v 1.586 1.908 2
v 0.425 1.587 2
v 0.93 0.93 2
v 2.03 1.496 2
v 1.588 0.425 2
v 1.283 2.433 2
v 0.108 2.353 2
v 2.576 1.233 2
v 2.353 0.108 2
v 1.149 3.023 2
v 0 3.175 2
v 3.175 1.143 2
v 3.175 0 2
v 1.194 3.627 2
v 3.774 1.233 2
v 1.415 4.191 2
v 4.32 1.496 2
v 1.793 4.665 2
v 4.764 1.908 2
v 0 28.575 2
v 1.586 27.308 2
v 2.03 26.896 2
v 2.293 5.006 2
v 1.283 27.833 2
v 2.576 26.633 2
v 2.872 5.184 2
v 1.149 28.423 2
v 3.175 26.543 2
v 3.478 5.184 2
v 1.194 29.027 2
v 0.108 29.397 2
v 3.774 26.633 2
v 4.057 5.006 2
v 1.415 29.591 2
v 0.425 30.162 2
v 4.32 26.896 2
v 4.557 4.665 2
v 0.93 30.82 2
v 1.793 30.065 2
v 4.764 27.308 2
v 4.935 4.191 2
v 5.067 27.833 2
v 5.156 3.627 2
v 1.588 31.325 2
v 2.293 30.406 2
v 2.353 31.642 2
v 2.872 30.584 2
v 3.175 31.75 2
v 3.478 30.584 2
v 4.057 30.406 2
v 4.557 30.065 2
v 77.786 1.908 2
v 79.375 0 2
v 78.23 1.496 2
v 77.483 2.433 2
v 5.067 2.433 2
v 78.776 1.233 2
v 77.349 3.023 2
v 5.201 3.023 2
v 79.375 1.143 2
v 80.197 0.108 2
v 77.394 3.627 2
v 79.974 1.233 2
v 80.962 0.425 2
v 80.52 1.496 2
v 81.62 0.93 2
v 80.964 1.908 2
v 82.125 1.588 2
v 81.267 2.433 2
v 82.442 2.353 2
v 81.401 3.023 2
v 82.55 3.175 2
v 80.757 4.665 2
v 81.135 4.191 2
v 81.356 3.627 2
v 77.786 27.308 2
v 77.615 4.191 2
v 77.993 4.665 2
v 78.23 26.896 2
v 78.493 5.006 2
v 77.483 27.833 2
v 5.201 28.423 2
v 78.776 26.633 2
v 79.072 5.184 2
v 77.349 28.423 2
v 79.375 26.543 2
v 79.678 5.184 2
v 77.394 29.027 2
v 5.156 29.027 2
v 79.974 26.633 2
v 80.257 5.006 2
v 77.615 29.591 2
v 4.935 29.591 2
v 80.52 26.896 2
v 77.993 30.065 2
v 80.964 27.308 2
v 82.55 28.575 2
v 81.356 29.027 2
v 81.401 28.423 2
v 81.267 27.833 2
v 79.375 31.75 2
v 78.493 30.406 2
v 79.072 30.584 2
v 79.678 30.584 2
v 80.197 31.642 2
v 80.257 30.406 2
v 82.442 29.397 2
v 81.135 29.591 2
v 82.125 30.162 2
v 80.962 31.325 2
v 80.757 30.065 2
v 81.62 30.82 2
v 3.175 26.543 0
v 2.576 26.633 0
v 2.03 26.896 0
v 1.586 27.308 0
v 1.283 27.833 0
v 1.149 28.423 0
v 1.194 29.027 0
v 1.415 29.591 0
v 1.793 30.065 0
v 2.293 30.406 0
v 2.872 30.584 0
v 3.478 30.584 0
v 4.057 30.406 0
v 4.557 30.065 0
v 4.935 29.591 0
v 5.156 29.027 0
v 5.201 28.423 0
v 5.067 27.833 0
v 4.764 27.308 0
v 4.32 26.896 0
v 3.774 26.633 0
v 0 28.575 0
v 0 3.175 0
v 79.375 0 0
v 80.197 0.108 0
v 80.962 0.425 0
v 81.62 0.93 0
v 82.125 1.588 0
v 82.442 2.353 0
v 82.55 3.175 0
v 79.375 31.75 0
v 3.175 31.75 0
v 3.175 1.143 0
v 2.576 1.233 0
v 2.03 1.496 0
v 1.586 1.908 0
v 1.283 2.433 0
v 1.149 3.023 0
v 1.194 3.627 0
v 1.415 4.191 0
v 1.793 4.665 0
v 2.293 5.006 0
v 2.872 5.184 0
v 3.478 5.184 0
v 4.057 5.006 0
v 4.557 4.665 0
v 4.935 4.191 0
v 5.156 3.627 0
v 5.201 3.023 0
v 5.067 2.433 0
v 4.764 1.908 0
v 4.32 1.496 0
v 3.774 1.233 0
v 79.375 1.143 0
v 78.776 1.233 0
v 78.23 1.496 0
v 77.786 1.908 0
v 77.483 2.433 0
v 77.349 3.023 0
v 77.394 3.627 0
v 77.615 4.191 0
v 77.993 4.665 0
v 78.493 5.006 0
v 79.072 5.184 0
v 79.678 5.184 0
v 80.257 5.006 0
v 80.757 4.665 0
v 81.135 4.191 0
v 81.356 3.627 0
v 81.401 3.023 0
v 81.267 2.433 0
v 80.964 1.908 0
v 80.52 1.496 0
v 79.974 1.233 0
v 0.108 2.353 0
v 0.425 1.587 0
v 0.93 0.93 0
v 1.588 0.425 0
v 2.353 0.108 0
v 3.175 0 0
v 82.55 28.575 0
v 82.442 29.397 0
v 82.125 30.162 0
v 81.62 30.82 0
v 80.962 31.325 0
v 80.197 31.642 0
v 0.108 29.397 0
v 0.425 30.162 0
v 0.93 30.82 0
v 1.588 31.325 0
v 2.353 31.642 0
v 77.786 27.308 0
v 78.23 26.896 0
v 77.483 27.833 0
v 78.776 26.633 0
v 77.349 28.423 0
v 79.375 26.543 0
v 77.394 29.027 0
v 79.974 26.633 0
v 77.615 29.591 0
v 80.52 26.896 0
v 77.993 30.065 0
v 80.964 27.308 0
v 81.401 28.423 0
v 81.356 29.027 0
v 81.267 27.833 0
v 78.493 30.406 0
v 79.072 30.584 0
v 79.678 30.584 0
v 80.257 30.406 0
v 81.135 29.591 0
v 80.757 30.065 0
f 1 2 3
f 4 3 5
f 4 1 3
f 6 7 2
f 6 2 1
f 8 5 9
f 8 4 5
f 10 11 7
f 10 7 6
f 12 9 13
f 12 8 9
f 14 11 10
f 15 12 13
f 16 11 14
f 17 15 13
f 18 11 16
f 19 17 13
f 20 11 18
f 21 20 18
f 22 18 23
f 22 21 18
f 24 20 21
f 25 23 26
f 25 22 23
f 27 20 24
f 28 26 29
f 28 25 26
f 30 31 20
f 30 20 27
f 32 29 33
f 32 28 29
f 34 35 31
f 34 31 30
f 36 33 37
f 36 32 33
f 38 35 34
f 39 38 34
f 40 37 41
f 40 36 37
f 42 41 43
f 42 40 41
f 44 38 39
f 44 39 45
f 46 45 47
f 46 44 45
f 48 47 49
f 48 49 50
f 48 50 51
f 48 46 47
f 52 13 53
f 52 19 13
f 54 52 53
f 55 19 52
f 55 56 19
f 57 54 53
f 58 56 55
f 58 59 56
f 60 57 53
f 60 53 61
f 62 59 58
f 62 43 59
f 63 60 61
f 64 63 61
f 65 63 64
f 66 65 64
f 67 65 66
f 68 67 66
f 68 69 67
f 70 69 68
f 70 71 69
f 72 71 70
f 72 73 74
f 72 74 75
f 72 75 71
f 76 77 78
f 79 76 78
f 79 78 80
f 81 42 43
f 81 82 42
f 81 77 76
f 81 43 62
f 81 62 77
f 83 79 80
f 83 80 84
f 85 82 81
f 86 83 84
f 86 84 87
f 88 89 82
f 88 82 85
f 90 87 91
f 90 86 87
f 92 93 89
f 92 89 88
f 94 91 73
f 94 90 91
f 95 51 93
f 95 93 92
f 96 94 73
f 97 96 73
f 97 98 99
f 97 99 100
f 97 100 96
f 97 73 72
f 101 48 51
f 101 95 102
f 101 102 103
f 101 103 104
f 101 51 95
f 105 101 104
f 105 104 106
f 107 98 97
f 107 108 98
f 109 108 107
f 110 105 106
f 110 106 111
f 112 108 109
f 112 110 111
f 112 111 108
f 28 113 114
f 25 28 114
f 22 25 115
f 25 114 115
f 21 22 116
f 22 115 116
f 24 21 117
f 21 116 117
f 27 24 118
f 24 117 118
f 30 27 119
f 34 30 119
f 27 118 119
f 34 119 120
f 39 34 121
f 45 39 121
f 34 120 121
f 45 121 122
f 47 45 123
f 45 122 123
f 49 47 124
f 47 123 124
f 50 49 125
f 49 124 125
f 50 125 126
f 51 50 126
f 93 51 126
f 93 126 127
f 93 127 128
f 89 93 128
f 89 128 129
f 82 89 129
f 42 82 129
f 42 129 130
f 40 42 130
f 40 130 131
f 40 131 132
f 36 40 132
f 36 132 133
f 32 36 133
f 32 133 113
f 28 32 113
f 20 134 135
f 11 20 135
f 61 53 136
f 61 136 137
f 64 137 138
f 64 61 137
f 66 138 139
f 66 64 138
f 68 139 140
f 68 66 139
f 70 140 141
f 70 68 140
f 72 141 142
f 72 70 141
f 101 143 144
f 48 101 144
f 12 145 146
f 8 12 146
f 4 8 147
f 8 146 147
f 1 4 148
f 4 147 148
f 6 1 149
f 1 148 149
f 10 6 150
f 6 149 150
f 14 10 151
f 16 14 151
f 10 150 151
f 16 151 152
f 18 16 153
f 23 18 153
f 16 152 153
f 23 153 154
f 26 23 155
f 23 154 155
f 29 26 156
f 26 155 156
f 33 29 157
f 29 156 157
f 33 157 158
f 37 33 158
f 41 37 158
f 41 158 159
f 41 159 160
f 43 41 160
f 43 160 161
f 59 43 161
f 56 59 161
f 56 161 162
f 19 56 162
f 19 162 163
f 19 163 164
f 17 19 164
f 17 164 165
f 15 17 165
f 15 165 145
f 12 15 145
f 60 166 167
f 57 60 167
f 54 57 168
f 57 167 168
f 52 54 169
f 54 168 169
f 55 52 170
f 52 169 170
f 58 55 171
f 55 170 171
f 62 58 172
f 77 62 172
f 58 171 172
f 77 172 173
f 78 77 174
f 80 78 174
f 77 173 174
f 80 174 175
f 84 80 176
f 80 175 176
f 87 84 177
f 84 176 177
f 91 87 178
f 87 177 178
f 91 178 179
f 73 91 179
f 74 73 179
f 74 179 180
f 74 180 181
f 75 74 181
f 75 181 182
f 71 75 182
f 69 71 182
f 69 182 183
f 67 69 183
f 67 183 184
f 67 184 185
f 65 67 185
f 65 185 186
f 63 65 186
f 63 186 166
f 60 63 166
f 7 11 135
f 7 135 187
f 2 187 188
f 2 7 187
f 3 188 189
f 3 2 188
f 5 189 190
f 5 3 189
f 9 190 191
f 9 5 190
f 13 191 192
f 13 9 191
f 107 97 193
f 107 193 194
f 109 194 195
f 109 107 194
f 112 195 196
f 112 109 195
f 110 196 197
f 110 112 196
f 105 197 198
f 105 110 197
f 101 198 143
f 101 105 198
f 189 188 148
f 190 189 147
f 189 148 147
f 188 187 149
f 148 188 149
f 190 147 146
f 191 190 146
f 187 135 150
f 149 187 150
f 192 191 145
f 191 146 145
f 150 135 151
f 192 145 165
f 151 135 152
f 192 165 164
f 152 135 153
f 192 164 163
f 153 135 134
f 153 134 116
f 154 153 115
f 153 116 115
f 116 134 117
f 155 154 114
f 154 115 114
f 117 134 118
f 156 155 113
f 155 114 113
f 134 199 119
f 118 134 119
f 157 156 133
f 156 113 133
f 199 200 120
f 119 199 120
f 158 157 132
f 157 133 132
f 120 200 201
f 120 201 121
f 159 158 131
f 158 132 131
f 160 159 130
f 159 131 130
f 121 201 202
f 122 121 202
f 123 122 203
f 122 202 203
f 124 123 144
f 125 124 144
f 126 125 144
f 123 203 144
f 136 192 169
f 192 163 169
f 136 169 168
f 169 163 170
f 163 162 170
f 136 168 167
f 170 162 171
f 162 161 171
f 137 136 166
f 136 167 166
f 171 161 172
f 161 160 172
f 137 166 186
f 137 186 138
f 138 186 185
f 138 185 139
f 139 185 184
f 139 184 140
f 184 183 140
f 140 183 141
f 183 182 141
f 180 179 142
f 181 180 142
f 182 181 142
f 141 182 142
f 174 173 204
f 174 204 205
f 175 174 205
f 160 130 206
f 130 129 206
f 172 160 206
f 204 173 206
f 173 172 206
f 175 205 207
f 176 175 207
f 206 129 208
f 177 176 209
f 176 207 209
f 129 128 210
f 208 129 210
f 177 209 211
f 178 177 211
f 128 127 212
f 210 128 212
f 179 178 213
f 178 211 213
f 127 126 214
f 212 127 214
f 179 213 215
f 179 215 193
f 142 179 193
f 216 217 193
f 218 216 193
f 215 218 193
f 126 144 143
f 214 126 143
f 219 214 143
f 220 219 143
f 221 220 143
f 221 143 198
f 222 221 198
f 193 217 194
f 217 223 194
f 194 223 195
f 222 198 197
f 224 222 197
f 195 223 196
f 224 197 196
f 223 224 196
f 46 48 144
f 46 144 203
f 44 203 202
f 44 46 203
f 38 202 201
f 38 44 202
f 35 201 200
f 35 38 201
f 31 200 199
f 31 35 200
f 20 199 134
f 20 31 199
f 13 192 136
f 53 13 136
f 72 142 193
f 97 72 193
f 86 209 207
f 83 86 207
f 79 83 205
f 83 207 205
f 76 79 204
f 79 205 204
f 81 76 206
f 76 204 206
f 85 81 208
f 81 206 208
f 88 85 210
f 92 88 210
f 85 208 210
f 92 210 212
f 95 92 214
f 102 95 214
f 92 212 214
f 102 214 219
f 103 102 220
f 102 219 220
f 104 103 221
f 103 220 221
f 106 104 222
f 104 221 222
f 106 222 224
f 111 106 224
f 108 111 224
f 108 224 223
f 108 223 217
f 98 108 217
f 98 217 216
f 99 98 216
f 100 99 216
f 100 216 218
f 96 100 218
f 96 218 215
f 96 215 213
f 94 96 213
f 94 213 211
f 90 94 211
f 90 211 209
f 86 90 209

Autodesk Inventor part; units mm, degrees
ref_plane "YZ Plane" through (0, 0, 0) normal (1, 0, 0) x (0, 1, 0)
ref_plane "XZ Plane" through (0, 0, 0) normal (0, 1, 0) x (-1, 0, 0)
ref_plane "XY Plane" through (0, 0, 0) normal (0, 0, 1) x (1, 0, 0)
sketch "Sketch1" plane through (0, 0, 0) normal (0, 0, 1) x (1, 0, 0)
  line L0 (0, 0) -> (82.55, 0)
  line L1 (82.55, 0) -> (82.55, 31.75)
  line L2 (82.55, 31.75) -> (0, 31.75)
  line L3 (0, 31.75) -> (0, 0)
  dimension "d0" = 82.55
  dimension "d1" = 31.75
extrude "Extrusion1" add sketch "Sketch1" along normal blind 2
fillet "Fillet1" radius 3.175 1 edges at (0, 31.75, 1)
fillet "Fillet2" radius 3.175 1 edges at (82.55, 31.75, 1)
fillet "Fillet3" radius 3.175 1 edges at (82.55, 0, 1)
fillet "Fillet4" radius 3.175 1 edges at (0, 0, 1)
sketch "Sketch2" plane through (0, 0, 2) normal (0, 0, 1) x (1, 0, 0)
  circle A0 centre (3.175, 3.175) radius 2.032
  arc A1 (0, 3.175) -> (3.175, 0) centre (3.175, 3.175) ccw projected
  line L0 (3.175, 0) -> (79.375, 0) projected
  arc A2 (79.375, 0) -> (82.55, 3.175) centre (79.375, 3.175) ccw projected
  line L1 (82.55, 3.175) -> (82.55, 28.575) projected
  arc A3 (82.55, 28.575) -> (79.375, 31.75) centre (79.375, 28.575) ccw projected
  line L2 (79.375, 31.75) -> (3.175, 31.75) projected
  arc A4 (3.175, 31.75) -> (0, 28.575) centre (3.175, 28.575) ccw projected
  line L3 (0, 28.575) -> (0, 3.175) projected
  point P0 (0, 0)
  dimension "d8" = 4.064
  dimension "d23" = 25.4
  dimension "d25" = 76.2
hole "Hole1" at (3.175, 3.175, 2) direction (0, 0, -1) diameter 4.064 end through all
sketch "Sketch7" plane through (0, 0, 2) normal (0, 0, 1) x (1, 0, 0)
  circle A0 centre (3.175, 3.175) radius 2.032 projected
  circle A1 centre (3.175, 3.175) radius 2.032 projected
  arc A2 (0, 3.175) -> (3.175, 0) centre (3.175, 3.175) ccw projected
  line L0 (3.175, 0) -> (79.375, 0) projected
  arc A3 (79.375, 0) -> (82.55, 3.175) centre (79.375, 3.175) ccw projected
  line L1 (82.55, 3.175) -> (82.55, 28.575) projected
  arc A4 (82.55, 28.575) -> (79.375, 31.75) centre (79.375, 28.575) ccw projected
  line L2 (79.375, 31.75) -> (3.175, 31.75) projected
  arc A5 (3.175, 31.75) -> (0, 28.575) centre (3.175, 28.575) ccw projected
  line L3 (0, 28.575) -> (0, 3.175) projected
  circle A6 centre (3.175, 28.575) radius 2.032
  point P0 (0, 0)
  dimension "d28" = 4.064
hole "Hole2" at (3.175, 28.575, 2) direction (0, 0, -1) diameter 4.064 end through all
sketch "Sketch8" plane through (0, 0, 2) normal (0, 0, 1) x (1, 0, 0)
  circle A0 centre (3.175, 3.175) radius 2.032 projected
  circle A1 centre (3.175, 28.575) radius 2.032 projected
  circle A2 centre (3.175, 3.175) radius 2.032 projected
  arc A3 (0, 3.175) -> (3.175, 0) centre (3.175, 3.175) ccw projected
  line L0 (3.175, 0) -> (79.375, 0) projected
  arc A4 (79.375, 0) -> (82.55, 3.175) centre (79.375, 3.175) ccw projected
  line L1 (82.55, 3.175) -> (82.55, 28.575) projected
  arc A5 (82.55, 28.575) -> (79.375, 31.75) centre (79.375, 28.575) ccw projected
  line L2 (79.375, 31.75) -> (3.175, 31.75) projected
  arc A6 (3.175, 31.75) -> (0, 28.575) centre (3.175, 28.575) ccw projected
  line L3 (0, 28.575) -> (0, 3.175) projected
  circle A7 centre (79.375, 28.575) radius 2.032
  point P0 (0, 0)
  dimension "d36" = 4.064
hole "Hole3" at (79.375, 28.575, 2) direction (0, 0, -1) diameter 4.064 end through all
sketch "Sketch9" plane through (0, 0, 2) normal (0, 0, 1) x (1, 0, 0)
  circle A0 centre (3.175, 3.175) radius 2.032 projected
  circle A1 centre (79.375, 28.575) radius 2.032 projected
  circle A2 centre (3.175, 28.575) radius 2.032 projected
  circle A3 centre (3.175, 3.175) radius 2.032 projected
  arc A4 (0, 3.175) -> (3.175, 0) centre (3.175, 3.175) ccw projected
  line L0 (3.175, 0) -> (79.375, 0) projected
  arc A5 (79.375, 0) -> (82.55, 3.175) centre (79.375, 3.175) ccw projected
  line L1 (82.55, 3.175) -> (82.55, 28.575) projected
  arc A6 (82.55, 28.575) -> (79.375, 31.75) centre (79.375, 28.575) ccw projected
  line L2 (79.375, 31.75) -> (3.175, 31.75) projected
  arc A7 (3.175, 31.75) -> (0, 28.575) centre (3.175, 28.575) ccw projected
  line L3 (0, 28.575) -> (0, 3.175) projected
  circle A8 centre (79.375, 3.175) radius 2.032
  point P0 (0, 0)
  dimension "d44" = 4.064
hole "Hole4" at (79.375, 3.175, 2) direction (0, 0, -1) diameter 4.064 end through all
properties part number "I6ABreakout"
